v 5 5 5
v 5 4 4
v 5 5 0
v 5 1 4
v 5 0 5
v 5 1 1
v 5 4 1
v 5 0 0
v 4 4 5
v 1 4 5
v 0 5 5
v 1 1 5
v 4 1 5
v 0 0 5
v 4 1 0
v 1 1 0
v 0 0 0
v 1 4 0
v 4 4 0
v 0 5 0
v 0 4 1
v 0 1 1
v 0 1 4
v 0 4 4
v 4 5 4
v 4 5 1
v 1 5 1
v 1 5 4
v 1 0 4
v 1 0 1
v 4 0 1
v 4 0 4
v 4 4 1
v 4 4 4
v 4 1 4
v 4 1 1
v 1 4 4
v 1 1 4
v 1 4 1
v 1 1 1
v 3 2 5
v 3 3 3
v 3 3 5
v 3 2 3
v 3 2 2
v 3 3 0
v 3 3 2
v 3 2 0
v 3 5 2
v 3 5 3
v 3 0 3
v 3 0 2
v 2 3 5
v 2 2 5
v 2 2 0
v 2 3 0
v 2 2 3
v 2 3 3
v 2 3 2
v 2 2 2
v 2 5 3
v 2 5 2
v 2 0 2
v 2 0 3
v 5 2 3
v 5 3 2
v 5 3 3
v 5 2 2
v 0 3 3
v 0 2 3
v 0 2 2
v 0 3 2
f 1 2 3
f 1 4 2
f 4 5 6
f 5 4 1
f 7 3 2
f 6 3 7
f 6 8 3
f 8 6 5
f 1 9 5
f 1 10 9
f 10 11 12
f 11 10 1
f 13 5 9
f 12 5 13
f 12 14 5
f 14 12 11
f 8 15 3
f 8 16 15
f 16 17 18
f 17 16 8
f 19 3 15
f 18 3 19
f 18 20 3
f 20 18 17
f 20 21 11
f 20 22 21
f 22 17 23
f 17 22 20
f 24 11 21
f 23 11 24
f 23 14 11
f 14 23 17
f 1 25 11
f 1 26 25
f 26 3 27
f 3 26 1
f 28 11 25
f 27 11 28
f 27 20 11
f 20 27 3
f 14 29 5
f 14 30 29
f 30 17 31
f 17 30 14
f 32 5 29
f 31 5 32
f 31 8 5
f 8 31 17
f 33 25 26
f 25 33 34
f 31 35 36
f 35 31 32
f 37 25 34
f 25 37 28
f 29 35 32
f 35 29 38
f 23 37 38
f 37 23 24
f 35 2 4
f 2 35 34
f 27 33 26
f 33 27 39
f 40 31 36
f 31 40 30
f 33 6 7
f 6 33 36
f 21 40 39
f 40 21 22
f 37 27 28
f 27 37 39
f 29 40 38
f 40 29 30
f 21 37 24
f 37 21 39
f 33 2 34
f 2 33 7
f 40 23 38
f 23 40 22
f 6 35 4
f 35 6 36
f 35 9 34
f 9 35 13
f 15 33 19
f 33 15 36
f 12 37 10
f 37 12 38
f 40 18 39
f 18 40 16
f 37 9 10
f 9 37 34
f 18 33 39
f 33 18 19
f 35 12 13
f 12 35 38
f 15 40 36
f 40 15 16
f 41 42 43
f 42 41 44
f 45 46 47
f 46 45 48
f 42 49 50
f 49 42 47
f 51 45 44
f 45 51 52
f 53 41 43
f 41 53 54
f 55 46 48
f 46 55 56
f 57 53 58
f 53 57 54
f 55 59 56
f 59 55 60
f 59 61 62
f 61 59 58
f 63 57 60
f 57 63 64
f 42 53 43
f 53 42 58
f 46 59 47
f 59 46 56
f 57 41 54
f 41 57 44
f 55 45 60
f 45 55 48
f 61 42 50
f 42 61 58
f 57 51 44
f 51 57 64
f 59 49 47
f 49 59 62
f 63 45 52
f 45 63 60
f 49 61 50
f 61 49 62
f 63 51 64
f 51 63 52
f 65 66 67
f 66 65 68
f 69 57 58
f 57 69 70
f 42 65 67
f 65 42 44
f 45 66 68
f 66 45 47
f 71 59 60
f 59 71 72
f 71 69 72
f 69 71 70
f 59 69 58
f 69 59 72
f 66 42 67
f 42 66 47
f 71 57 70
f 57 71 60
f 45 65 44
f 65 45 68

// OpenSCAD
//The thickness of the Cube
CubeThickness=1;
//The size of the gap between the cross and the cube, measured on each face
GapSize=1;
//The thickness of the Cross
CrossThickness=1;
/* [Hidden] */
Size=1;
CubeHoleSize=GapSize*2+CrossThickness;
RealSize=CubeThickness*2+CubeHoleSize;
difference() {
    difference() {
        difference() {
            cube(RealSize);
            translate([CubeThickness,0,CubeThickness]) {
                cube([CubeHoleSize,RealSize,CubeHoleSize]);
            }
        }
        translate([0,CubeThickness,CubeThickness]) {
            cube([RealSize,CubeHoleSize,CubeHoleSize]);
        }
    }
    translate([CubeThickness,CubeThickness,0]) {
        cube([CubeHoleSize,CubeHoleSize,RealSize]);
    }
}
translate([CubeThickness+GapSize,CubeThickness+GapSize,0]) {
    cube([CrossThickness,CrossThickness,RealSize]);
}
translate([CubeThickness+GapSize,0,CubeThickness+GapSize]) {
    cube([CrossThickness,RealSize,CrossThickness]);
}
translate([0,CubeThickness+GapSize,CubeThickness+GapSize]) {
    cube([RealSize,CrossThickness,CrossThickness]);
}                                                                                       
